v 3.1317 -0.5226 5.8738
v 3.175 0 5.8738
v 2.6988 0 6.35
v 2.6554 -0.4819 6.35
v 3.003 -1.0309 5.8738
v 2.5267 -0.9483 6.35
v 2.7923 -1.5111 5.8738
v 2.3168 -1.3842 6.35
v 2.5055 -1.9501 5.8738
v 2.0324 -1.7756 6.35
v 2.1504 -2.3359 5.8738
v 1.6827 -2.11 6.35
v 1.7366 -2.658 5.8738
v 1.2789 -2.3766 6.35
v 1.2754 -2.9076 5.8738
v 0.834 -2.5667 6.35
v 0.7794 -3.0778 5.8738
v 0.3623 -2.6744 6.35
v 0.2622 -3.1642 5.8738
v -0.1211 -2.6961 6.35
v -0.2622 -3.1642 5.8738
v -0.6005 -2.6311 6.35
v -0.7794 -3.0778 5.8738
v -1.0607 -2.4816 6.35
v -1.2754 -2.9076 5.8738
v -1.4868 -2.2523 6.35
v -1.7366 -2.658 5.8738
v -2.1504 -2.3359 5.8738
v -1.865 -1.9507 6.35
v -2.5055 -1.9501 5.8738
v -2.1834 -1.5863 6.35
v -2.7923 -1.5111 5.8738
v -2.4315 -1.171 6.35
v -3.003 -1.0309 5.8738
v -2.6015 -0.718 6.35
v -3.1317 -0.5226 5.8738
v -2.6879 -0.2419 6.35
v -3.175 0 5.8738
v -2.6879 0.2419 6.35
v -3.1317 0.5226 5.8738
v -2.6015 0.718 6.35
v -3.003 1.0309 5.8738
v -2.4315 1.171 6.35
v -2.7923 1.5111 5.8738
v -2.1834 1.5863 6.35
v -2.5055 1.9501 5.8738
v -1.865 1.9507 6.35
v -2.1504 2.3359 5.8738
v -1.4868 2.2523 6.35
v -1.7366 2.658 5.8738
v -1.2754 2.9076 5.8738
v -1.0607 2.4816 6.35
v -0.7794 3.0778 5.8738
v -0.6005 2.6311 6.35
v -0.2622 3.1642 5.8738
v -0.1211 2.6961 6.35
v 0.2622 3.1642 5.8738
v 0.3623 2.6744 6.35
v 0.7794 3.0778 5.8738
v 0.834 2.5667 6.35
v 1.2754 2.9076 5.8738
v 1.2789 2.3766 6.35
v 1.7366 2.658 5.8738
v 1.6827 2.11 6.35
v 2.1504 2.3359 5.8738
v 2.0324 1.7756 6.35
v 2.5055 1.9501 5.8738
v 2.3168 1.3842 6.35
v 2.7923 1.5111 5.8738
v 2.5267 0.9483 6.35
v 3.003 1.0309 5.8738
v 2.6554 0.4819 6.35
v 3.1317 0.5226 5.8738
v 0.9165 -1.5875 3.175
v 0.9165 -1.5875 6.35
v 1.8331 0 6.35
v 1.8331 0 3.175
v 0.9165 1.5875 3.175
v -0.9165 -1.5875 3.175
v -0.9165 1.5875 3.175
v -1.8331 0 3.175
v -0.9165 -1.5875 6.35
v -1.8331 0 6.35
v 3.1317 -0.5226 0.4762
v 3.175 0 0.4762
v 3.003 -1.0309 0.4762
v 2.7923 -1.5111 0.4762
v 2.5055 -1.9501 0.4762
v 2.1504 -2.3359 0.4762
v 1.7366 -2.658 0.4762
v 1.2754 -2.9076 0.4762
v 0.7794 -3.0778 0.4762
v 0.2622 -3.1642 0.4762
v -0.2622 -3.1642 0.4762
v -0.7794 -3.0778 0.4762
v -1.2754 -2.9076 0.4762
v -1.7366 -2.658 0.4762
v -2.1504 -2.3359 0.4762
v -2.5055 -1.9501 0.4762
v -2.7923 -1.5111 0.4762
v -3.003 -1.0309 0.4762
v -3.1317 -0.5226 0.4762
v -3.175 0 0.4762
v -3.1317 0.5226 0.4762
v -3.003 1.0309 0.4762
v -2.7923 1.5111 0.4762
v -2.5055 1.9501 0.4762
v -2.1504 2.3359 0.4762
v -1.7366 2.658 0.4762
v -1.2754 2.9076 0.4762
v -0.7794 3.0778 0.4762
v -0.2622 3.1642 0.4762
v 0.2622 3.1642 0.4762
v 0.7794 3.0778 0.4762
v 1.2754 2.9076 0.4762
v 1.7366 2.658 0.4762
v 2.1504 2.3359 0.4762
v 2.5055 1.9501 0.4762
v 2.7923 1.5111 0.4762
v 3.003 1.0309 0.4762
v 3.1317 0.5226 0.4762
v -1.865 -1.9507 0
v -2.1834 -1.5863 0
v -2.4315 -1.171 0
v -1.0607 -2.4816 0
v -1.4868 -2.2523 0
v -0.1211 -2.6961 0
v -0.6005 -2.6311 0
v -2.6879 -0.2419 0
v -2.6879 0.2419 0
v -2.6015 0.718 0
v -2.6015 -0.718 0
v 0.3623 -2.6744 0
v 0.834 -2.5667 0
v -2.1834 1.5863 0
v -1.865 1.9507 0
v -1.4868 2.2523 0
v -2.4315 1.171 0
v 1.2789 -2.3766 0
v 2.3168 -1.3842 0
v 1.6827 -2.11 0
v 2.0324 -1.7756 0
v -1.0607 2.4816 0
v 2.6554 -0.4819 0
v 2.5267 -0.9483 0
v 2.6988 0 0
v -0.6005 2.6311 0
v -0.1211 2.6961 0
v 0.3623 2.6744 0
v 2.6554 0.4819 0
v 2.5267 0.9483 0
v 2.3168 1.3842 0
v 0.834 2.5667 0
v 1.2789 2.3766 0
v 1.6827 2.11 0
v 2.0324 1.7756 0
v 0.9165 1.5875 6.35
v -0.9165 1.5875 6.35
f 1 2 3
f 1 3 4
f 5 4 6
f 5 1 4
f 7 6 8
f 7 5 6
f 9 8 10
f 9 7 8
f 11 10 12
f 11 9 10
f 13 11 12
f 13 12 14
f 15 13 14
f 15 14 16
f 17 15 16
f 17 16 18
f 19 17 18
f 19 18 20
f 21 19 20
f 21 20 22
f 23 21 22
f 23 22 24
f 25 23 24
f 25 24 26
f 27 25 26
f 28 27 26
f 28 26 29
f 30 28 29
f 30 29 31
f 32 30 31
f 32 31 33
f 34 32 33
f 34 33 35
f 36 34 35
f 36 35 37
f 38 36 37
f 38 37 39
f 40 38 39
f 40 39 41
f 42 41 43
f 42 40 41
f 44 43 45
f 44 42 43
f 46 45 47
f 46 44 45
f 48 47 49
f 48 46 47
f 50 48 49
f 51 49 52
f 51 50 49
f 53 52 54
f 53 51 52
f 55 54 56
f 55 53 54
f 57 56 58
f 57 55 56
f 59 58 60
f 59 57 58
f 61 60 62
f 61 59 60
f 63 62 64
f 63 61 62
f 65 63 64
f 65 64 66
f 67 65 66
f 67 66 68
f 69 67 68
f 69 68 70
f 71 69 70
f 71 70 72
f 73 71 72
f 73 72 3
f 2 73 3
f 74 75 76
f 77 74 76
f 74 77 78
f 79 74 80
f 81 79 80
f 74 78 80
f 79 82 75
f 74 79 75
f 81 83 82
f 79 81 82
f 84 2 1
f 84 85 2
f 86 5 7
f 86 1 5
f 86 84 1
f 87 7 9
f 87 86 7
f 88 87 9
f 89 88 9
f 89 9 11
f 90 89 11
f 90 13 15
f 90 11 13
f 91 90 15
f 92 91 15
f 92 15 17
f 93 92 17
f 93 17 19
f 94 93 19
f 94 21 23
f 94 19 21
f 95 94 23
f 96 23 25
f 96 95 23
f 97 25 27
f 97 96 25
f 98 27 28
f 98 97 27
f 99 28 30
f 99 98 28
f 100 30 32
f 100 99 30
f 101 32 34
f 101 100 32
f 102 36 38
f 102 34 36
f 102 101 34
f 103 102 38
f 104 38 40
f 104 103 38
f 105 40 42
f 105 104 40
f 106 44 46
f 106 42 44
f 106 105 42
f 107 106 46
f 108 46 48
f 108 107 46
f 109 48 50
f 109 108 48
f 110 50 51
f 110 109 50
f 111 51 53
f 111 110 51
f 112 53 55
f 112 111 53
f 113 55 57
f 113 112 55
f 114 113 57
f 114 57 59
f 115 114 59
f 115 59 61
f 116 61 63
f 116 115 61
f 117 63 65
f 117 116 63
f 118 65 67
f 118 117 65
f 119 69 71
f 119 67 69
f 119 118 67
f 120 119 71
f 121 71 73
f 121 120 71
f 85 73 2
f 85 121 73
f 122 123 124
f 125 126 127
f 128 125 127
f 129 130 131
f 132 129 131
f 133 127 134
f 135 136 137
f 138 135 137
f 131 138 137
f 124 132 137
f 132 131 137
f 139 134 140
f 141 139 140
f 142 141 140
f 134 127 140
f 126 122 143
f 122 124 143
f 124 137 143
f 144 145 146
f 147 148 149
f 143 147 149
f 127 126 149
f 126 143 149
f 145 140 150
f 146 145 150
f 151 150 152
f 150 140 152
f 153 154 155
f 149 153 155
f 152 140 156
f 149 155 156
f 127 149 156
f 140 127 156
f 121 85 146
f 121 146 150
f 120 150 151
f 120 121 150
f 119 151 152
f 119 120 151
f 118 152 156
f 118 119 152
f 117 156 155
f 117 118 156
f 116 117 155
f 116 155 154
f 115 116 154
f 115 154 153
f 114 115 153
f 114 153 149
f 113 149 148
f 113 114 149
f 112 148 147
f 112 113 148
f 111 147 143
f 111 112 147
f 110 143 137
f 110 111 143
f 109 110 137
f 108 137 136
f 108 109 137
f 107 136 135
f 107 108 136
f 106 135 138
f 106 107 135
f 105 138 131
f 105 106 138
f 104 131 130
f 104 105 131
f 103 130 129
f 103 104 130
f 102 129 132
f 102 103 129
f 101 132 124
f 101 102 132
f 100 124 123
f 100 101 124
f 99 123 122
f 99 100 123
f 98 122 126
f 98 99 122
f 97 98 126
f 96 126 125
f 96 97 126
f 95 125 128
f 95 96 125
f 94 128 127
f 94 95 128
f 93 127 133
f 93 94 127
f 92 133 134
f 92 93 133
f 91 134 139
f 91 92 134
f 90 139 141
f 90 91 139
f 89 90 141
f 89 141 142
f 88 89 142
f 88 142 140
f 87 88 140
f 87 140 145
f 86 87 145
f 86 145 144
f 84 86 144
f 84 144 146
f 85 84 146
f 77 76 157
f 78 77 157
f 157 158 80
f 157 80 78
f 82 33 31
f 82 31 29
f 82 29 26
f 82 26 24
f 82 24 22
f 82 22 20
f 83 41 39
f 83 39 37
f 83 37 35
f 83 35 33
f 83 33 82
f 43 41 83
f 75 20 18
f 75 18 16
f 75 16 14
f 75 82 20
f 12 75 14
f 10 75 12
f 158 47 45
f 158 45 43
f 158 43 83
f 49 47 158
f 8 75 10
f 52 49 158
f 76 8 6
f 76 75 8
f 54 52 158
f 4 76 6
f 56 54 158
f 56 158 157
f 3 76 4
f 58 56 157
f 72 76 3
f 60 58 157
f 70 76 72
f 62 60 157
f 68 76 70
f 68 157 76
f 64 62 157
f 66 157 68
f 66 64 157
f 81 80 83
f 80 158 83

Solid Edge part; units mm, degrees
sketch "Sketch1" plane through (0, 0, 0) normal (0, 0, 1) x (1, 0, 0)
  circle A0 centre (0, 0) radius 3.175
  dimension "D1" = 6.35
extrude "Protrusion1" add sketch "Sketch1" along normal blind 6.35
chamfer "Chamfer1" distance 0.4762 angle 45 2 edges at (-3.175, 0, 0) (-3.175, 0, 6.35)
sketch "Sketch2" plane through (0, 0, 6.35) normal (0, 0, 1) x (1, 0, 0)
  line L0 (-0.9165, 1.5875) -> (0.9165, 1.5875)
  line L1 (1.8331, 0) -> (0.9165, 1.5875)
  line L2 (0.9165, -1.5875) -> (1.8331, 0)
  line L3 (-0.9165, -1.5875) -> (0.9165, -1.5875)
  line L4 (-1.8331, 0) -> (-0.9165, -1.5875)
  line L5 (-0.9165, 1.5875) -> (-1.8331, 0)
  dimension "D1" = 3.175
extrude "Cutout1" cut sketch "Sketch2" against normal blind 3.175
properties part number "24100599"
